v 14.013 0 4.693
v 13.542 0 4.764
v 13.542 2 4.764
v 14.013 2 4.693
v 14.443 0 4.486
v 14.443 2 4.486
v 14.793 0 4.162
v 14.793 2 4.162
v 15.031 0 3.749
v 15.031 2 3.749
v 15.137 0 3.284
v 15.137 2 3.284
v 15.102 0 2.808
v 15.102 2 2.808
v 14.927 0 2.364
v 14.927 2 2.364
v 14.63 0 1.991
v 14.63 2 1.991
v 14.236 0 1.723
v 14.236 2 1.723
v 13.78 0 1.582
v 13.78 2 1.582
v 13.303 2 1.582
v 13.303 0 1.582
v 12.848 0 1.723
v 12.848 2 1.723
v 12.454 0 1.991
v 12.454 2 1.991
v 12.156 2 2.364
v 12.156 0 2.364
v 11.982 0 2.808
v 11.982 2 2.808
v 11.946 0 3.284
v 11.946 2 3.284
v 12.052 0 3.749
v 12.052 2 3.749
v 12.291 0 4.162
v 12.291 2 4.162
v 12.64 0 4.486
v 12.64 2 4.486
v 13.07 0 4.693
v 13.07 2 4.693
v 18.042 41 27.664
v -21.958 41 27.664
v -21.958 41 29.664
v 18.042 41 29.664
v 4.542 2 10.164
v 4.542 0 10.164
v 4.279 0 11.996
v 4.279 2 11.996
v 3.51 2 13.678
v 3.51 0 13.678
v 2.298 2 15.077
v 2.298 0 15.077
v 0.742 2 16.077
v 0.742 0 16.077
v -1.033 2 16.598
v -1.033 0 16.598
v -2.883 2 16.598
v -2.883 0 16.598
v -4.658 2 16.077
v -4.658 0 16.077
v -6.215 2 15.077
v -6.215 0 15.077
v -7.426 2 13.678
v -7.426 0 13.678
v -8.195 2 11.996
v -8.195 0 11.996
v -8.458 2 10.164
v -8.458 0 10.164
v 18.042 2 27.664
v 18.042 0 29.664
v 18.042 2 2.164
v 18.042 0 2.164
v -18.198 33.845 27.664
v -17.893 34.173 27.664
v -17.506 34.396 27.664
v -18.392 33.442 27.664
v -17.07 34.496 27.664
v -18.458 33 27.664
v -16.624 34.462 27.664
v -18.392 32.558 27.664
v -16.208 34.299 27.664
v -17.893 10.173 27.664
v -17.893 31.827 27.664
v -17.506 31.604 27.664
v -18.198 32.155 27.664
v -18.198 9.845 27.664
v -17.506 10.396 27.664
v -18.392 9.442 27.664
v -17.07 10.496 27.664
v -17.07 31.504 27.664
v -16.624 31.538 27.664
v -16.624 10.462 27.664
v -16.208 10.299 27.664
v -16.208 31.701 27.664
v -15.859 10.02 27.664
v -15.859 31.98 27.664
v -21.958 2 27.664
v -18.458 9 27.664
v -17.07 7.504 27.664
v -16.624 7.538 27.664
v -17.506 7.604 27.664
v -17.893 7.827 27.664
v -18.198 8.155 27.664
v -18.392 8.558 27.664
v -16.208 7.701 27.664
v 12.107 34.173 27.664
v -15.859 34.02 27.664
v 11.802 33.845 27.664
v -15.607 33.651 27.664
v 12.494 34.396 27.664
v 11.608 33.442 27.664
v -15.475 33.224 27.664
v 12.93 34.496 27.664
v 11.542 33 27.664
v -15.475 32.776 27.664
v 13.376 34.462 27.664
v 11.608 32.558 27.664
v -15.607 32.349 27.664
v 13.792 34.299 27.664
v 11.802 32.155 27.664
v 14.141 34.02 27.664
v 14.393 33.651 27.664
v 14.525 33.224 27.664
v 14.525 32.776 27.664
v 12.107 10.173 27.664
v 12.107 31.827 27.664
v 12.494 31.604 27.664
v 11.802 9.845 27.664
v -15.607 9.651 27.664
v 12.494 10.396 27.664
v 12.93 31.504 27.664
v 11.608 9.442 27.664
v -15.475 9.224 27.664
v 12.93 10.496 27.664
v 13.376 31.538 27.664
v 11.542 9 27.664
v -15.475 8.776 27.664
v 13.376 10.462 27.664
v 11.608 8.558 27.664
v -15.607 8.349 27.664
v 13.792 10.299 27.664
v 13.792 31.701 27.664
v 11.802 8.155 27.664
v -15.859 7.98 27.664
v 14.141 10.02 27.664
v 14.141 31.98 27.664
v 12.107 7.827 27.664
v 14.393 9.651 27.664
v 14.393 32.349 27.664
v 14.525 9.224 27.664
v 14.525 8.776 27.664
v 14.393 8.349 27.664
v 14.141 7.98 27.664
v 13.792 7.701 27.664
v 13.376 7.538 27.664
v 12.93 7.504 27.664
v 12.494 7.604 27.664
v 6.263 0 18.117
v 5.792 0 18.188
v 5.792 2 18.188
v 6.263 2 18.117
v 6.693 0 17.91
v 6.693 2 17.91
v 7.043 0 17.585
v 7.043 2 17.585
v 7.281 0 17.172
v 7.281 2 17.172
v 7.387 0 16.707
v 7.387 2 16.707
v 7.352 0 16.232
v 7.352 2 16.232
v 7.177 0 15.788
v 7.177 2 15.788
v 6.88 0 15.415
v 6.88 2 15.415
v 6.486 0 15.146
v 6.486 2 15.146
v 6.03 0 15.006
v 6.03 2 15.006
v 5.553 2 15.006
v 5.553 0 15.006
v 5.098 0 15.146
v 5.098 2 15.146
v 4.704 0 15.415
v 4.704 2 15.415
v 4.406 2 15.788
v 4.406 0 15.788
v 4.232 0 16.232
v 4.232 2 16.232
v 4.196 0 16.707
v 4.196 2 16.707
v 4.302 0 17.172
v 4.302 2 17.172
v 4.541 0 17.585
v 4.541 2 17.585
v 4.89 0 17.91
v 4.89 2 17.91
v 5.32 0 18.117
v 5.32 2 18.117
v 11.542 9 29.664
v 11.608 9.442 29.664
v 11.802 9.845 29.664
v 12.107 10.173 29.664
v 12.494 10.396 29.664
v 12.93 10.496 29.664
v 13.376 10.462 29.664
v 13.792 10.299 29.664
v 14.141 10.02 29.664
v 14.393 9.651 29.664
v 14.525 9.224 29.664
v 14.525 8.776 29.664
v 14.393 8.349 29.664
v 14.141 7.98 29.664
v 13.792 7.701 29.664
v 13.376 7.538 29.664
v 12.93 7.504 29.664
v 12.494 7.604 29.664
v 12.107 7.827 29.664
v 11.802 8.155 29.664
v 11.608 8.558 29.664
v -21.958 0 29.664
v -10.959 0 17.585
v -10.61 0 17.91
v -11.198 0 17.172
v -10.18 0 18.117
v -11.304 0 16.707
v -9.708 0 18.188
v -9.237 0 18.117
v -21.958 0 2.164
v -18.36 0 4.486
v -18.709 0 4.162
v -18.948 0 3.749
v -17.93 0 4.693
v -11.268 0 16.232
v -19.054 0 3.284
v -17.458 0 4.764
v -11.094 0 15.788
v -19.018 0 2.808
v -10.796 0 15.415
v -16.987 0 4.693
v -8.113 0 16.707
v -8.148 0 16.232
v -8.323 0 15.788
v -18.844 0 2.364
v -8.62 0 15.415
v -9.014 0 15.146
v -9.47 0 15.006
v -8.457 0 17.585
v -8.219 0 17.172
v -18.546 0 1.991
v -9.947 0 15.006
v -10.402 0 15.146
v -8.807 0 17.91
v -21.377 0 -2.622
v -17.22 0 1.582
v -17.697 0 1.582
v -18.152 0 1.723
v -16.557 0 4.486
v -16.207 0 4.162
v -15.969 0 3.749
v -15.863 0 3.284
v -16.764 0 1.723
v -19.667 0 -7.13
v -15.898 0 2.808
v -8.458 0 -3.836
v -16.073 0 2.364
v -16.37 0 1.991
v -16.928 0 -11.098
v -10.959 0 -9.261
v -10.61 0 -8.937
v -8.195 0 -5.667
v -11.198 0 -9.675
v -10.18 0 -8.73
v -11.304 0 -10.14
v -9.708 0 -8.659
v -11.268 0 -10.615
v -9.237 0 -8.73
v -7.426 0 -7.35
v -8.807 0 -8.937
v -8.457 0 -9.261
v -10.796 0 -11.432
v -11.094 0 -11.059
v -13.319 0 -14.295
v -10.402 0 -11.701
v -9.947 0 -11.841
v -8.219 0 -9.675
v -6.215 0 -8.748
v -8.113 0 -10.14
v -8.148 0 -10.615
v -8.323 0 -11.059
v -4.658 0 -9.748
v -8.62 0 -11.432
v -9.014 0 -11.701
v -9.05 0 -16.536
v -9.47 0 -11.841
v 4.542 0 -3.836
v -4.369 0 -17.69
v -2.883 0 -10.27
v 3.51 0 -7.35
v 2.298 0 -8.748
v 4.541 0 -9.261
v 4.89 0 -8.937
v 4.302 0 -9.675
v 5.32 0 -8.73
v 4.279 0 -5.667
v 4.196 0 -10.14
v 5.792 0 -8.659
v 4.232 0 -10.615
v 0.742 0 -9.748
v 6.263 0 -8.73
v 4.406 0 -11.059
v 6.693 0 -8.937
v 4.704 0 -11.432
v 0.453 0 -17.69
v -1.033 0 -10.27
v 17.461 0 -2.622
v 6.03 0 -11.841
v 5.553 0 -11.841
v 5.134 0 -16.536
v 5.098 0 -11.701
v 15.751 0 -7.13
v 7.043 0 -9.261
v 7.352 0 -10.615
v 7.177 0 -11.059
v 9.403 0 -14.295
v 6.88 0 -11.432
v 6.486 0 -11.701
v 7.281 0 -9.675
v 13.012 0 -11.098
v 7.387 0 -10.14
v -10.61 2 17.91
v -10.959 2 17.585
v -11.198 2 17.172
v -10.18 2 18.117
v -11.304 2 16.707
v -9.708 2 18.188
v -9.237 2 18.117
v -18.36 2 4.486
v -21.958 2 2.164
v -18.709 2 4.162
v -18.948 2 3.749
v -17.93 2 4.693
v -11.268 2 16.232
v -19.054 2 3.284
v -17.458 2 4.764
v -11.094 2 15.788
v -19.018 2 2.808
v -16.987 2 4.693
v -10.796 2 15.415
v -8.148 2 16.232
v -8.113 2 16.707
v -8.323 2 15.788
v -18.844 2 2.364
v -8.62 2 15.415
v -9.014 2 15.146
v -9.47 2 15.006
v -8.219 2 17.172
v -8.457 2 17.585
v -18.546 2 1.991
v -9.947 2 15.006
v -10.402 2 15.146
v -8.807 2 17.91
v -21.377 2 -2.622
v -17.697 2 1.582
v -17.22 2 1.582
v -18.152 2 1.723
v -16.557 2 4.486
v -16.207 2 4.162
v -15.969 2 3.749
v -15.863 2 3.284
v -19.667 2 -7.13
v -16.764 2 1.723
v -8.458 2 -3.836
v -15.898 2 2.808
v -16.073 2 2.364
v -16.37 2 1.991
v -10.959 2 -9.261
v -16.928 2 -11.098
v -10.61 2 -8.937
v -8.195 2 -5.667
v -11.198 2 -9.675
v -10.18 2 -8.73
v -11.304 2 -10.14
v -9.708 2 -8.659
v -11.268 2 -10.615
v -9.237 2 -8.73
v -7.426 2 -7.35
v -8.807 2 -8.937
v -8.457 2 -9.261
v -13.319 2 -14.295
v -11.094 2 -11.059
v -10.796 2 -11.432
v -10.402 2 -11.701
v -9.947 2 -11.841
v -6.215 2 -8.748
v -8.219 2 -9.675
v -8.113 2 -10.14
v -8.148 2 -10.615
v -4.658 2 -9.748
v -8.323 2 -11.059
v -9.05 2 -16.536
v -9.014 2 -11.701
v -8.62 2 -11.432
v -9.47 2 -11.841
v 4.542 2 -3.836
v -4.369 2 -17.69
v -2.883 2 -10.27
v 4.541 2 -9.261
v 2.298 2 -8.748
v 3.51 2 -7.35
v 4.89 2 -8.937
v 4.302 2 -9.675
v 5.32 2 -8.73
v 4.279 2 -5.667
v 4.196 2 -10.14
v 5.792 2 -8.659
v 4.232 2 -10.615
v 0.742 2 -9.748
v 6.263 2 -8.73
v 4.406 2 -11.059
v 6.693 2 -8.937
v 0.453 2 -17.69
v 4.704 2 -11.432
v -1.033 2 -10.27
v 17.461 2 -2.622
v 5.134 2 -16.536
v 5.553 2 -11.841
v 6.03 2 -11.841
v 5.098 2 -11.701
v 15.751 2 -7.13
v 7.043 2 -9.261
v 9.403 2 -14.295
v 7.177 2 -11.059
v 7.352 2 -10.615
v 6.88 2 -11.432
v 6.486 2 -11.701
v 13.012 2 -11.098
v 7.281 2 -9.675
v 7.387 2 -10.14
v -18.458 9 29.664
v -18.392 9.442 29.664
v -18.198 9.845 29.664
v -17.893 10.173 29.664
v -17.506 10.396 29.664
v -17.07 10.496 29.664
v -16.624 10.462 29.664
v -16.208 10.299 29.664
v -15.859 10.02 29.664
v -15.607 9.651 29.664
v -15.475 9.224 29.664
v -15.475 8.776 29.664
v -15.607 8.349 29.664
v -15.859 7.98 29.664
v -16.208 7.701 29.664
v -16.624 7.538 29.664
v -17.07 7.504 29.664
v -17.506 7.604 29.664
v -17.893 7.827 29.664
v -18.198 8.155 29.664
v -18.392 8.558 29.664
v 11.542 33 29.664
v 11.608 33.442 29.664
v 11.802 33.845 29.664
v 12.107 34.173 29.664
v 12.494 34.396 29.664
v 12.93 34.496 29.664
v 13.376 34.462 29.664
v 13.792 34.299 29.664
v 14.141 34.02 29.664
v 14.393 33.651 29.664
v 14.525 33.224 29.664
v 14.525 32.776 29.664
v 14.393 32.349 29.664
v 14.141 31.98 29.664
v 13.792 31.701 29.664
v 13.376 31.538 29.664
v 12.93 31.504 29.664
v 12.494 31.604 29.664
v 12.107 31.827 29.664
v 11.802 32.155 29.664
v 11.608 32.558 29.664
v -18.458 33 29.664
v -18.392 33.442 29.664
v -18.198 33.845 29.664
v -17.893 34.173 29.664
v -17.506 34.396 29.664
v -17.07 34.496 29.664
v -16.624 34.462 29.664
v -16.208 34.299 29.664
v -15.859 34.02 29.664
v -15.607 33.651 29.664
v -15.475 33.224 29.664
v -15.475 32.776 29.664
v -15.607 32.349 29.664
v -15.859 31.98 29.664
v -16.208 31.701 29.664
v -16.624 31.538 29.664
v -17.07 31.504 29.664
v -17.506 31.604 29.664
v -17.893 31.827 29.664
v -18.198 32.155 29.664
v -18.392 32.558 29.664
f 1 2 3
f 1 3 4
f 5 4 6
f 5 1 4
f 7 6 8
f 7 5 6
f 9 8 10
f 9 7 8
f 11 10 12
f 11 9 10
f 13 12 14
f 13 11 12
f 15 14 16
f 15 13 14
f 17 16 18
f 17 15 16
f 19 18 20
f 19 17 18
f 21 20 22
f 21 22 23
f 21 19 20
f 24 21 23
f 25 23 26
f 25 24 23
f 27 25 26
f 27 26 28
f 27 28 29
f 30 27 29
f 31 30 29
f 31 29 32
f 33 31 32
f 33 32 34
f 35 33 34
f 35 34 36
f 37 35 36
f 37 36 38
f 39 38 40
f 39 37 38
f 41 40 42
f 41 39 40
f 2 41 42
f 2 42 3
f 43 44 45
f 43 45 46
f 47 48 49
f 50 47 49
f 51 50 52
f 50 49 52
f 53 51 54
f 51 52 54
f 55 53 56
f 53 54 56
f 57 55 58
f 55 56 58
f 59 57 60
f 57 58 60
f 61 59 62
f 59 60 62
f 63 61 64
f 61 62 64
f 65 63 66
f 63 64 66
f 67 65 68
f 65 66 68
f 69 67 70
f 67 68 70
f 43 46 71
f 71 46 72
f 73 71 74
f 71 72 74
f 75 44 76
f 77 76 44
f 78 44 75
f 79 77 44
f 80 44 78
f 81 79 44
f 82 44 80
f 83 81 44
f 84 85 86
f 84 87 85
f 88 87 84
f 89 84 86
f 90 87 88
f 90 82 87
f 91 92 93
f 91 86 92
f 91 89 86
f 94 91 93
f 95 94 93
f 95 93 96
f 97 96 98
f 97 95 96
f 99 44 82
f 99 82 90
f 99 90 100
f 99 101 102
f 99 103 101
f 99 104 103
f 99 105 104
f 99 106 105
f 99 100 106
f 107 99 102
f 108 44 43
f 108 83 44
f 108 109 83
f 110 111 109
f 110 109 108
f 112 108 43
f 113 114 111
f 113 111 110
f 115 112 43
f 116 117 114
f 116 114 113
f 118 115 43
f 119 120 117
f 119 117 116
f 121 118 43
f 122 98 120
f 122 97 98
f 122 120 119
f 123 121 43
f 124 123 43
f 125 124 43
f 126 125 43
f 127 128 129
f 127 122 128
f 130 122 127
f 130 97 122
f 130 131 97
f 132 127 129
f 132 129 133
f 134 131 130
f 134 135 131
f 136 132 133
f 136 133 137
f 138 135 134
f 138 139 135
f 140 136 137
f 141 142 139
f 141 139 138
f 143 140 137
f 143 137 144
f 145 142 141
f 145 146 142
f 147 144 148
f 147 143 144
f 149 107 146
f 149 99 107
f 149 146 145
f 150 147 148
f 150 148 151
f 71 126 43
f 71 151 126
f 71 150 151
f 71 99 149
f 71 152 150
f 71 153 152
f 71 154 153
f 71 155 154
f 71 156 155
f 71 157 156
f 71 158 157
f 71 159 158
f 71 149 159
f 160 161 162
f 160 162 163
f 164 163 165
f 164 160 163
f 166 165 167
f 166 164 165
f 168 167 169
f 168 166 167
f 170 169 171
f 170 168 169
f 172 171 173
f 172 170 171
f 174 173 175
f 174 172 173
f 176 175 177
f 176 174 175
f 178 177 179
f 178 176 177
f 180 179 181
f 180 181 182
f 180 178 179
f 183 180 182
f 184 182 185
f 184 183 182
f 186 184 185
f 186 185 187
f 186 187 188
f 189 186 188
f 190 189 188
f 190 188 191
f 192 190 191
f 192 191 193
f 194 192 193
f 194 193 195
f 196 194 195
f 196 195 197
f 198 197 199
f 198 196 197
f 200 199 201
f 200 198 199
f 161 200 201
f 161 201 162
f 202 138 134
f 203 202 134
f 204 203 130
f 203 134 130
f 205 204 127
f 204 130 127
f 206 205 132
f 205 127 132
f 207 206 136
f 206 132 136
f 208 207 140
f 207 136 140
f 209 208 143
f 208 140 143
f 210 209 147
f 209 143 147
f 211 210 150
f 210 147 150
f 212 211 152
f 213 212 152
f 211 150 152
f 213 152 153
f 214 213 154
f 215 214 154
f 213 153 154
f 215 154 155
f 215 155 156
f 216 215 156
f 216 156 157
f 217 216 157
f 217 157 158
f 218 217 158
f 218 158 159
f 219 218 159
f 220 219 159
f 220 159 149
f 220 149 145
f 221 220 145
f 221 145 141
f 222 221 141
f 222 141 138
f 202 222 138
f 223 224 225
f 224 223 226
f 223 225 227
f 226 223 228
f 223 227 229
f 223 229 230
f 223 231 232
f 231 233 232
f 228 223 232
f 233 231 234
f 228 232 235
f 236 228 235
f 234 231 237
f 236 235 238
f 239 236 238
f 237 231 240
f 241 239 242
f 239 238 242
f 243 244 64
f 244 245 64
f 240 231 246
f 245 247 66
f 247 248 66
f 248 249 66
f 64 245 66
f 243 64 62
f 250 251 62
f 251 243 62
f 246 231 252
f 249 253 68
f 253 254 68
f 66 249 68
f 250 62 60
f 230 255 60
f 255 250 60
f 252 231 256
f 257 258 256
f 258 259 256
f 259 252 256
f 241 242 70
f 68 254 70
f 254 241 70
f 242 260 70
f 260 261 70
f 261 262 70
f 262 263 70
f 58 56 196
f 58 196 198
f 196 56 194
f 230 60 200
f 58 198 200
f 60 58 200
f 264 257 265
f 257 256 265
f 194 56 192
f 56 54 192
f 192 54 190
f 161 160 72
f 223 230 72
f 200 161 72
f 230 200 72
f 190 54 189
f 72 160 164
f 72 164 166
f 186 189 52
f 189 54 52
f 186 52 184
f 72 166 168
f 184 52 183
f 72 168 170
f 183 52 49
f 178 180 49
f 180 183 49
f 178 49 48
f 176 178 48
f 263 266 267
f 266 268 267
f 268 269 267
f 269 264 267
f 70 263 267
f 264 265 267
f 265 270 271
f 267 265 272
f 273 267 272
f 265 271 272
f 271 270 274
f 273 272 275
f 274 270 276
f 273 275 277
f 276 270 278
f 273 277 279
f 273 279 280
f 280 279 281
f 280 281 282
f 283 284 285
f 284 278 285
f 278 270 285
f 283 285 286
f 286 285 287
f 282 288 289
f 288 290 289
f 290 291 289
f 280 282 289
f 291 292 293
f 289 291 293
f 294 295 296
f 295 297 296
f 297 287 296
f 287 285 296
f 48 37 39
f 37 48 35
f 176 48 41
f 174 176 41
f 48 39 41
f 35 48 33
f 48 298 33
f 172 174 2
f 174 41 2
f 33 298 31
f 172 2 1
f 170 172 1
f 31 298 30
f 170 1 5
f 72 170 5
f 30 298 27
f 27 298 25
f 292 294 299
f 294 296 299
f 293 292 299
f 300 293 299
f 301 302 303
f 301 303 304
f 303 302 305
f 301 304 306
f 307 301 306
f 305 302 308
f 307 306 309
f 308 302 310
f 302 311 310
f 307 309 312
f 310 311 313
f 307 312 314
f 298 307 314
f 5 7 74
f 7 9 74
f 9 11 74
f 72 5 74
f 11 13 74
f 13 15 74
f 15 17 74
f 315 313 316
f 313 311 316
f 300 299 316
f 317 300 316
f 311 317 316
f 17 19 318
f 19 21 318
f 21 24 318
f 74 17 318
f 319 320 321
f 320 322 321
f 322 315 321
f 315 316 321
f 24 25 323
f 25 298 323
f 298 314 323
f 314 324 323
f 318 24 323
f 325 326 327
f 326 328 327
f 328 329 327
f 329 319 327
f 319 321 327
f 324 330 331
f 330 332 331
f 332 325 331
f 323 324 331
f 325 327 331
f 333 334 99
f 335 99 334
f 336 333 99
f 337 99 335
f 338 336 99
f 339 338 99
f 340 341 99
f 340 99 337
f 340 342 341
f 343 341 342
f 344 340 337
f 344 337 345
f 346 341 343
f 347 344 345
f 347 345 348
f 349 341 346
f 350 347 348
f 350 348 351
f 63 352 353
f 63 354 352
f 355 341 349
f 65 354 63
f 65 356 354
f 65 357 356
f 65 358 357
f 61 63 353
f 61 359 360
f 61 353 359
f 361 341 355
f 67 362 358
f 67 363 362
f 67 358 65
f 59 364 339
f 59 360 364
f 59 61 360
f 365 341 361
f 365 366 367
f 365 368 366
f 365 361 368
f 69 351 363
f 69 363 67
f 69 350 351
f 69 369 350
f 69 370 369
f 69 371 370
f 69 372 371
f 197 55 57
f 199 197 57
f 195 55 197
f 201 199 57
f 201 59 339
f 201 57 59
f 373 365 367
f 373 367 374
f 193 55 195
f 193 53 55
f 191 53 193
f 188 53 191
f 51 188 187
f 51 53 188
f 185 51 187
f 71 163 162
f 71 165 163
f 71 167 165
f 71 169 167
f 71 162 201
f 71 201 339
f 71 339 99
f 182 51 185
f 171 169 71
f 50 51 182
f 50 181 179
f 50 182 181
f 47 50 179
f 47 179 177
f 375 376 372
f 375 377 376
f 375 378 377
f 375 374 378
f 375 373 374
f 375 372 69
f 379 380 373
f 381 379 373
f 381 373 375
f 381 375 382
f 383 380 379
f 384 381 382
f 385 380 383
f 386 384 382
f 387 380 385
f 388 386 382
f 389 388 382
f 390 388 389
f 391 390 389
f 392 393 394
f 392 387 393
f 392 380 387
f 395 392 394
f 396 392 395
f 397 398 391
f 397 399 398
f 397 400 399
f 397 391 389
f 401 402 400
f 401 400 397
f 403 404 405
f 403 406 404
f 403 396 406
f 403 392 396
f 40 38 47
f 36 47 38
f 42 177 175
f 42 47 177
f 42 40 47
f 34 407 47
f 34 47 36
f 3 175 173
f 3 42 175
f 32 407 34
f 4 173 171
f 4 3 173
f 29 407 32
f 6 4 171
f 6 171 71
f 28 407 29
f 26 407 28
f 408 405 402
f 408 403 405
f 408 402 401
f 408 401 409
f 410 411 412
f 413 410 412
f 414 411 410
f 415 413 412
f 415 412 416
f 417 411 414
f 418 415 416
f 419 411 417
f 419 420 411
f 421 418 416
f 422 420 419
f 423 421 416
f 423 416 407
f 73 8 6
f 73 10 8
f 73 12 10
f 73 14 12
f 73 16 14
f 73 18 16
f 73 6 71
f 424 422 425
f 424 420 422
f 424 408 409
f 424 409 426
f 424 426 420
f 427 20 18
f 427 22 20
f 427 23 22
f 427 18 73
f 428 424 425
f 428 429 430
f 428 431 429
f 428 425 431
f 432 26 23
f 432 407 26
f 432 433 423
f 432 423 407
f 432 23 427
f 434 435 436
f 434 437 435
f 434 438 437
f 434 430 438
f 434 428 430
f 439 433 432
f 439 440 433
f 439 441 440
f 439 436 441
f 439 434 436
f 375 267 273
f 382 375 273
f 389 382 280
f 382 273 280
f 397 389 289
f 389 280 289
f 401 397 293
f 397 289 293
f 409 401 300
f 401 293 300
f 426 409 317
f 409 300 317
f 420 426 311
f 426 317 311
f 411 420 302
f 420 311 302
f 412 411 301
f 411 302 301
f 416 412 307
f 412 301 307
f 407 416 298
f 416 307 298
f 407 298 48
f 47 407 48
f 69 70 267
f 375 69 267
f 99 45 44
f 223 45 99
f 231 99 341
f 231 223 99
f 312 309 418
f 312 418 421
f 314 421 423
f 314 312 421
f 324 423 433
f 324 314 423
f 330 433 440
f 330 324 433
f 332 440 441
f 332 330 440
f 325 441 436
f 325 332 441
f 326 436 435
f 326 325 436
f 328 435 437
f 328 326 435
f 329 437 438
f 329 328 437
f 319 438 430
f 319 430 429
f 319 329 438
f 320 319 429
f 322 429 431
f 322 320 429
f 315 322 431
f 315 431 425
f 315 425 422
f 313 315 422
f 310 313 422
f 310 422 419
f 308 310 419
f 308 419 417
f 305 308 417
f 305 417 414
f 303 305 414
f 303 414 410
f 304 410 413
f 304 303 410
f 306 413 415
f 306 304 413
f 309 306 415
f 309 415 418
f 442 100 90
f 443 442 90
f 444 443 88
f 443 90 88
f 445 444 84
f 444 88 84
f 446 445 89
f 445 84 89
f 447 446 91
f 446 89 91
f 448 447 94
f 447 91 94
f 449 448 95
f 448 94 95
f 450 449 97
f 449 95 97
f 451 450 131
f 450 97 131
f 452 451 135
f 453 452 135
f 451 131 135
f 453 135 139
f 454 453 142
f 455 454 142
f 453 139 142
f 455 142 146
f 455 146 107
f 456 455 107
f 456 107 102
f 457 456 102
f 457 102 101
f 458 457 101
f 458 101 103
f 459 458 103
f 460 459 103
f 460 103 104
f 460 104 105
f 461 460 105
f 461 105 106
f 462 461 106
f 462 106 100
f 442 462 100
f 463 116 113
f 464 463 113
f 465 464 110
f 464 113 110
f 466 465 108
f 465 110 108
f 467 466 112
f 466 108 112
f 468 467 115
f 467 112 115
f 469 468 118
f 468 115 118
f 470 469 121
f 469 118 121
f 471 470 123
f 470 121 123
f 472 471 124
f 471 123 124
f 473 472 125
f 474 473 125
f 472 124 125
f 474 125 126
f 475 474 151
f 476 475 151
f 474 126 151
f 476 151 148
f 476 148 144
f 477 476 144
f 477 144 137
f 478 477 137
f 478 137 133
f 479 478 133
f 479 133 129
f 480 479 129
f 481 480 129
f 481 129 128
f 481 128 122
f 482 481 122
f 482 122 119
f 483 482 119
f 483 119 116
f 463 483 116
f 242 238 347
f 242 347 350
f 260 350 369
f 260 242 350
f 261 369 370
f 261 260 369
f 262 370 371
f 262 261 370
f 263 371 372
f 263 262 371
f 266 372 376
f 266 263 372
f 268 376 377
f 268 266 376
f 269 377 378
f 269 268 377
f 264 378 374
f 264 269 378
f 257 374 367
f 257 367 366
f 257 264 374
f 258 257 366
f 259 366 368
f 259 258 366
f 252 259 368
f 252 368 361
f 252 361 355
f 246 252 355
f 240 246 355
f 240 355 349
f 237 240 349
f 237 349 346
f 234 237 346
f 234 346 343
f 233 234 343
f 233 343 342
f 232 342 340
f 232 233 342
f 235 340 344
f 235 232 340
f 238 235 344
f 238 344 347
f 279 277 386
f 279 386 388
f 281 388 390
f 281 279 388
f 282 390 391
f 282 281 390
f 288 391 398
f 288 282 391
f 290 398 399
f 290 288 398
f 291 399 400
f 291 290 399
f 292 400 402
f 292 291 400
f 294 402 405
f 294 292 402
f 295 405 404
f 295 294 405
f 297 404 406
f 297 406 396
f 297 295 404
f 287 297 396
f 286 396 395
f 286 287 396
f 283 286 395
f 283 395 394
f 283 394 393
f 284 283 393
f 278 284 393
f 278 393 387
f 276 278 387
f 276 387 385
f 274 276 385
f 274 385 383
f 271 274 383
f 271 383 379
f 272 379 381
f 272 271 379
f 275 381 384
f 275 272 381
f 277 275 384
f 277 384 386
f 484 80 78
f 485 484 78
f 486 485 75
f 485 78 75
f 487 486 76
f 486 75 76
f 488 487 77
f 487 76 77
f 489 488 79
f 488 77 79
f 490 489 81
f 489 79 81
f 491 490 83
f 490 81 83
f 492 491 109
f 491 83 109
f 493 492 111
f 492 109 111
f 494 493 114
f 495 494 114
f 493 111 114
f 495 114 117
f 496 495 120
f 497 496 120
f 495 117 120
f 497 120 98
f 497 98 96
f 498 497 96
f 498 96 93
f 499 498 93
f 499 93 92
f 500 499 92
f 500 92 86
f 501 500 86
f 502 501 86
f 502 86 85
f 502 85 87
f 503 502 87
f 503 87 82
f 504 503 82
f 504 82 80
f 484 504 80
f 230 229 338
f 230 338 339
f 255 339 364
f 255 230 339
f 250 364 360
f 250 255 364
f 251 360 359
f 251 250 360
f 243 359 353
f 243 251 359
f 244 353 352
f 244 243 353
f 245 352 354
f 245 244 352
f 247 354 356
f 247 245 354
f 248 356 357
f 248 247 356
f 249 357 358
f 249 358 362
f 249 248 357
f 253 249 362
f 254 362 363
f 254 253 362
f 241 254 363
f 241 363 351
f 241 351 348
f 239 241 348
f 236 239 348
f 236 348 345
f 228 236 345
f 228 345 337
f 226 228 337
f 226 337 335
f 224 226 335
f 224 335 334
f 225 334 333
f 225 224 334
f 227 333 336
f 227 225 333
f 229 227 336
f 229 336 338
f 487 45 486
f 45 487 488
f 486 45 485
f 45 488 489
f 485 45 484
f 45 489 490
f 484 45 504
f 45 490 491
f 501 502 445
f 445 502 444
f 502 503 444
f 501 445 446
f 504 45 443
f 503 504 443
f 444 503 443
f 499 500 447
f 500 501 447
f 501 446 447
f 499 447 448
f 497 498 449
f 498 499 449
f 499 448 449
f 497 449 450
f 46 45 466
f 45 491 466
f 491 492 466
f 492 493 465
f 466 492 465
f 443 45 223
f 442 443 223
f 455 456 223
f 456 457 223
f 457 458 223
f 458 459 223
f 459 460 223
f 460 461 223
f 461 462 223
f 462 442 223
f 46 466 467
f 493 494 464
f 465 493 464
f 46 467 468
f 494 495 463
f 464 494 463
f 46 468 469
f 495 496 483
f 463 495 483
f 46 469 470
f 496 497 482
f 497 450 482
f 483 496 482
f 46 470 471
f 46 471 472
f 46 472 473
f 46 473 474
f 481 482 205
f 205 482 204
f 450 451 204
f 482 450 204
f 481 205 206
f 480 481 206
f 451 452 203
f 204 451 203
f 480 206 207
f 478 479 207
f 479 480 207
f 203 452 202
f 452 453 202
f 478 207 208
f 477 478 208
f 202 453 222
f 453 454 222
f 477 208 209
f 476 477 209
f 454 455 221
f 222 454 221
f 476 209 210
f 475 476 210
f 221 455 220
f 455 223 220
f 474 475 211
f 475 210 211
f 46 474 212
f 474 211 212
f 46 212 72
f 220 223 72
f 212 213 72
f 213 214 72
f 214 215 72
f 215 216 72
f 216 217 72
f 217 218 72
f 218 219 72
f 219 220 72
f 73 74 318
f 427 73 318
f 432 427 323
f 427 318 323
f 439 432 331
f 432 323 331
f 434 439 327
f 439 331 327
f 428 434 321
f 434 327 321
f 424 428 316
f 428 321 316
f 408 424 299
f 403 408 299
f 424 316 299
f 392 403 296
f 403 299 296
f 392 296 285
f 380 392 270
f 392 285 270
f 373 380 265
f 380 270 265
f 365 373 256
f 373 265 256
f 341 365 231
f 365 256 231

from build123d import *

# Parameters (mm, degrees)
SKETCH_1_R          = 1.6
EXTRUDE_1_DEPTH     = 2
SKETCH_2_W          = 40
SKETCH_2_H          = 2
EXTRUDE_2_DEPTH     = 39
SKETCH_3_R          = 1.5
CUT_EXTRUDE_1_DEPTH = 66.064678839


with BuildPart() as part:
    # 草图1 → 凸台-拉伸1 (new body)
    with BuildSketch(Plane(origin=(0, 0, 0), x_dir=(1, 0, 0), z_dir=(0, 1, 0))):
        with BuildLine():
            Line((-21.958197384, -2.164323425), (-21.958197384, -29.664323425))
            Line((-21.958197384, -29.664323425), (18.041802616, -29.664323425))
            Line((18.041802616, -29.664323425), (18.041802616, -2.164323425))
            ThreePointArc((18.041802616, -2.164323425), (-1.958197384, 17.835676575), (-21.958197384, -2.164323425))
        make_face()
        with Locations(Location((-9.708197384, 10.259070334, 0), (0, 0, 270))):
            Circle(SKETCH_1_R, mode=Mode.SUBTRACT)
        with Locations(Location((-17.458197384, -3.164323425, 0), (0, 0, 270))):
            Circle(SKETCH_1_R, mode=Mode.SUBTRACT)
        with Locations(Location((-9.708197384, -16.587717183, 0), (0, 0, 270))):
            Circle(SKETCH_1_R, mode=Mode.SUBTRACT)
        with Locations(Location((5.791802616, -16.587717183, 0), (0, 0, 270))):
            Circle(SKETCH_1_R, mode=Mode.SUBTRACT)
        with Locations(Location((13.541802616, -3.164323425, 0), (0, 0, 270))):
            Circle(SKETCH_1_R, mode=Mode.SUBTRACT)
        with Locations(Location((5.791802616, 10.259070334, 0), (0, 0, 270))):
            Circle(SKETCH_1_R, mode=Mode.SUBTRACT)
        with BuildLine():
            Line((4.541802616, 3.835676575), (4.541802616, -10.164323425))
            ThreePointArc((4.541802616, -10.164323425), (-1.958197384, -16.664323425), (-8.458197384, -10.164323425))
            Line((-8.458197384, -10.164323425), (-8.458197384, 3.835676575))
            ThreePointArc((-8.458197384, 3.835676575), (-1.958197384, 10.335676575), (4.541802616, 3.835676575))
        make_face(mode=Mode.SUBTRACT)
    extrude(amount=EXTRUDE_1_DEPTH)

    # 草图2 → 凸台-拉伸2 (add)
    with BuildSketch(Plane(origin=(0, 2, 0), x_dir=(1, 0, 0), z_dir=(0, 1, 0))):
        with Locations((-1.958197384, -28.664323425)):
            Rectangle(SKETCH_2_W, SKETCH_2_H)
    extrude(amount=EXTRUDE_2_DEPTH)

    # 草图3 → 切除-拉伸1 (cut, through all)
    with BuildSketch(Plane(origin=(0, 0, 27.664323425), x_dir=(-1, 0, 0), z_dir=(0, 0, -1))):
        with Locations((-13.041802616, 33)):
            Circle(SKETCH_3_R)
        with Locations((-13.041802616, 9)):
            Circle(SKETCH_3_R)
        with Locations((16.958197384, 33)):
            Circle(SKETCH_3_R)
        with Locations((16.958197384, 9)):
            Circle(SKETCH_3_R)
    extrude(amount=-CUT_EXTRUDE_1_DEPTH, mode=Mode.SUBTRACT)


solid = part.part
